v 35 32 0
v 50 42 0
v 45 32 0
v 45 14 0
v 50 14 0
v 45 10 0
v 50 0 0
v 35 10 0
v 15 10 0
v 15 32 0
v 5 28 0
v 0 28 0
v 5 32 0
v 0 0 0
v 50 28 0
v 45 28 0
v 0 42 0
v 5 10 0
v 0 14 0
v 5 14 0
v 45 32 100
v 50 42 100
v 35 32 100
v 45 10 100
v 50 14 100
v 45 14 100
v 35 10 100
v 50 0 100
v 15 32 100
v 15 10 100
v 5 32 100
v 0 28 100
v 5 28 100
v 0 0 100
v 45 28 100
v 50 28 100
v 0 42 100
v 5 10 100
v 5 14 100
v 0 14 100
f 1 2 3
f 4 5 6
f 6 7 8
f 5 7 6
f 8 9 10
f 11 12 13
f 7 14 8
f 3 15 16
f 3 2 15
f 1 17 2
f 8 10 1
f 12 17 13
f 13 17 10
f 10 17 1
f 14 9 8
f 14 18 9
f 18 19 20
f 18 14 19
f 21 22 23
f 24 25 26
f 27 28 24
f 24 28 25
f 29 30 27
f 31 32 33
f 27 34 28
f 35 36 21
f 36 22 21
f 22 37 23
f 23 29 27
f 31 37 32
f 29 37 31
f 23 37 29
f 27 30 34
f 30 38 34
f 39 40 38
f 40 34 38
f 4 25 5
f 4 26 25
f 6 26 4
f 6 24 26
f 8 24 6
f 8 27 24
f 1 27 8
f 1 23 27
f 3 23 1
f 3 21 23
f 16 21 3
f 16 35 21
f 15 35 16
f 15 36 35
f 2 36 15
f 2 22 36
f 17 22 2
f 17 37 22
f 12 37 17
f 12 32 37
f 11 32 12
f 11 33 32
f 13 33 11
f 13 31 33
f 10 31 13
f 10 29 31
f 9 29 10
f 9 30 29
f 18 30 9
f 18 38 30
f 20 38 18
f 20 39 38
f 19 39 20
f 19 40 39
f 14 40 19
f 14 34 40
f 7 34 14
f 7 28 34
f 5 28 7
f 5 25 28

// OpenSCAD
$fn = 32;

// ----------------------------------------------------------------------
// T-slot rail: 50 x 42 mm section, 100 mm long
// ----------------------------------------------------------------------

// --- parameters (mm) ---
profile_height = 100;     // extrusion height
profile_points = 20;      // points of the closed outline

profile = [[0, 0], [50, 0], [50, 14], [45, 14], [45, 10], [35, 10], [35, 32], [45, 32], [45, 28], [50, 28], [50, 42], [0, 42], [0, 28], [5, 28], [5, 32], [15, 32], [15, 10], [5, 10], [5, 14], [0, 14]];  // single closed polygon, 20 points, counter clockwise

// --- the one profile operation ---
linear_extrude(height = profile_height) polygon(points = profile);
